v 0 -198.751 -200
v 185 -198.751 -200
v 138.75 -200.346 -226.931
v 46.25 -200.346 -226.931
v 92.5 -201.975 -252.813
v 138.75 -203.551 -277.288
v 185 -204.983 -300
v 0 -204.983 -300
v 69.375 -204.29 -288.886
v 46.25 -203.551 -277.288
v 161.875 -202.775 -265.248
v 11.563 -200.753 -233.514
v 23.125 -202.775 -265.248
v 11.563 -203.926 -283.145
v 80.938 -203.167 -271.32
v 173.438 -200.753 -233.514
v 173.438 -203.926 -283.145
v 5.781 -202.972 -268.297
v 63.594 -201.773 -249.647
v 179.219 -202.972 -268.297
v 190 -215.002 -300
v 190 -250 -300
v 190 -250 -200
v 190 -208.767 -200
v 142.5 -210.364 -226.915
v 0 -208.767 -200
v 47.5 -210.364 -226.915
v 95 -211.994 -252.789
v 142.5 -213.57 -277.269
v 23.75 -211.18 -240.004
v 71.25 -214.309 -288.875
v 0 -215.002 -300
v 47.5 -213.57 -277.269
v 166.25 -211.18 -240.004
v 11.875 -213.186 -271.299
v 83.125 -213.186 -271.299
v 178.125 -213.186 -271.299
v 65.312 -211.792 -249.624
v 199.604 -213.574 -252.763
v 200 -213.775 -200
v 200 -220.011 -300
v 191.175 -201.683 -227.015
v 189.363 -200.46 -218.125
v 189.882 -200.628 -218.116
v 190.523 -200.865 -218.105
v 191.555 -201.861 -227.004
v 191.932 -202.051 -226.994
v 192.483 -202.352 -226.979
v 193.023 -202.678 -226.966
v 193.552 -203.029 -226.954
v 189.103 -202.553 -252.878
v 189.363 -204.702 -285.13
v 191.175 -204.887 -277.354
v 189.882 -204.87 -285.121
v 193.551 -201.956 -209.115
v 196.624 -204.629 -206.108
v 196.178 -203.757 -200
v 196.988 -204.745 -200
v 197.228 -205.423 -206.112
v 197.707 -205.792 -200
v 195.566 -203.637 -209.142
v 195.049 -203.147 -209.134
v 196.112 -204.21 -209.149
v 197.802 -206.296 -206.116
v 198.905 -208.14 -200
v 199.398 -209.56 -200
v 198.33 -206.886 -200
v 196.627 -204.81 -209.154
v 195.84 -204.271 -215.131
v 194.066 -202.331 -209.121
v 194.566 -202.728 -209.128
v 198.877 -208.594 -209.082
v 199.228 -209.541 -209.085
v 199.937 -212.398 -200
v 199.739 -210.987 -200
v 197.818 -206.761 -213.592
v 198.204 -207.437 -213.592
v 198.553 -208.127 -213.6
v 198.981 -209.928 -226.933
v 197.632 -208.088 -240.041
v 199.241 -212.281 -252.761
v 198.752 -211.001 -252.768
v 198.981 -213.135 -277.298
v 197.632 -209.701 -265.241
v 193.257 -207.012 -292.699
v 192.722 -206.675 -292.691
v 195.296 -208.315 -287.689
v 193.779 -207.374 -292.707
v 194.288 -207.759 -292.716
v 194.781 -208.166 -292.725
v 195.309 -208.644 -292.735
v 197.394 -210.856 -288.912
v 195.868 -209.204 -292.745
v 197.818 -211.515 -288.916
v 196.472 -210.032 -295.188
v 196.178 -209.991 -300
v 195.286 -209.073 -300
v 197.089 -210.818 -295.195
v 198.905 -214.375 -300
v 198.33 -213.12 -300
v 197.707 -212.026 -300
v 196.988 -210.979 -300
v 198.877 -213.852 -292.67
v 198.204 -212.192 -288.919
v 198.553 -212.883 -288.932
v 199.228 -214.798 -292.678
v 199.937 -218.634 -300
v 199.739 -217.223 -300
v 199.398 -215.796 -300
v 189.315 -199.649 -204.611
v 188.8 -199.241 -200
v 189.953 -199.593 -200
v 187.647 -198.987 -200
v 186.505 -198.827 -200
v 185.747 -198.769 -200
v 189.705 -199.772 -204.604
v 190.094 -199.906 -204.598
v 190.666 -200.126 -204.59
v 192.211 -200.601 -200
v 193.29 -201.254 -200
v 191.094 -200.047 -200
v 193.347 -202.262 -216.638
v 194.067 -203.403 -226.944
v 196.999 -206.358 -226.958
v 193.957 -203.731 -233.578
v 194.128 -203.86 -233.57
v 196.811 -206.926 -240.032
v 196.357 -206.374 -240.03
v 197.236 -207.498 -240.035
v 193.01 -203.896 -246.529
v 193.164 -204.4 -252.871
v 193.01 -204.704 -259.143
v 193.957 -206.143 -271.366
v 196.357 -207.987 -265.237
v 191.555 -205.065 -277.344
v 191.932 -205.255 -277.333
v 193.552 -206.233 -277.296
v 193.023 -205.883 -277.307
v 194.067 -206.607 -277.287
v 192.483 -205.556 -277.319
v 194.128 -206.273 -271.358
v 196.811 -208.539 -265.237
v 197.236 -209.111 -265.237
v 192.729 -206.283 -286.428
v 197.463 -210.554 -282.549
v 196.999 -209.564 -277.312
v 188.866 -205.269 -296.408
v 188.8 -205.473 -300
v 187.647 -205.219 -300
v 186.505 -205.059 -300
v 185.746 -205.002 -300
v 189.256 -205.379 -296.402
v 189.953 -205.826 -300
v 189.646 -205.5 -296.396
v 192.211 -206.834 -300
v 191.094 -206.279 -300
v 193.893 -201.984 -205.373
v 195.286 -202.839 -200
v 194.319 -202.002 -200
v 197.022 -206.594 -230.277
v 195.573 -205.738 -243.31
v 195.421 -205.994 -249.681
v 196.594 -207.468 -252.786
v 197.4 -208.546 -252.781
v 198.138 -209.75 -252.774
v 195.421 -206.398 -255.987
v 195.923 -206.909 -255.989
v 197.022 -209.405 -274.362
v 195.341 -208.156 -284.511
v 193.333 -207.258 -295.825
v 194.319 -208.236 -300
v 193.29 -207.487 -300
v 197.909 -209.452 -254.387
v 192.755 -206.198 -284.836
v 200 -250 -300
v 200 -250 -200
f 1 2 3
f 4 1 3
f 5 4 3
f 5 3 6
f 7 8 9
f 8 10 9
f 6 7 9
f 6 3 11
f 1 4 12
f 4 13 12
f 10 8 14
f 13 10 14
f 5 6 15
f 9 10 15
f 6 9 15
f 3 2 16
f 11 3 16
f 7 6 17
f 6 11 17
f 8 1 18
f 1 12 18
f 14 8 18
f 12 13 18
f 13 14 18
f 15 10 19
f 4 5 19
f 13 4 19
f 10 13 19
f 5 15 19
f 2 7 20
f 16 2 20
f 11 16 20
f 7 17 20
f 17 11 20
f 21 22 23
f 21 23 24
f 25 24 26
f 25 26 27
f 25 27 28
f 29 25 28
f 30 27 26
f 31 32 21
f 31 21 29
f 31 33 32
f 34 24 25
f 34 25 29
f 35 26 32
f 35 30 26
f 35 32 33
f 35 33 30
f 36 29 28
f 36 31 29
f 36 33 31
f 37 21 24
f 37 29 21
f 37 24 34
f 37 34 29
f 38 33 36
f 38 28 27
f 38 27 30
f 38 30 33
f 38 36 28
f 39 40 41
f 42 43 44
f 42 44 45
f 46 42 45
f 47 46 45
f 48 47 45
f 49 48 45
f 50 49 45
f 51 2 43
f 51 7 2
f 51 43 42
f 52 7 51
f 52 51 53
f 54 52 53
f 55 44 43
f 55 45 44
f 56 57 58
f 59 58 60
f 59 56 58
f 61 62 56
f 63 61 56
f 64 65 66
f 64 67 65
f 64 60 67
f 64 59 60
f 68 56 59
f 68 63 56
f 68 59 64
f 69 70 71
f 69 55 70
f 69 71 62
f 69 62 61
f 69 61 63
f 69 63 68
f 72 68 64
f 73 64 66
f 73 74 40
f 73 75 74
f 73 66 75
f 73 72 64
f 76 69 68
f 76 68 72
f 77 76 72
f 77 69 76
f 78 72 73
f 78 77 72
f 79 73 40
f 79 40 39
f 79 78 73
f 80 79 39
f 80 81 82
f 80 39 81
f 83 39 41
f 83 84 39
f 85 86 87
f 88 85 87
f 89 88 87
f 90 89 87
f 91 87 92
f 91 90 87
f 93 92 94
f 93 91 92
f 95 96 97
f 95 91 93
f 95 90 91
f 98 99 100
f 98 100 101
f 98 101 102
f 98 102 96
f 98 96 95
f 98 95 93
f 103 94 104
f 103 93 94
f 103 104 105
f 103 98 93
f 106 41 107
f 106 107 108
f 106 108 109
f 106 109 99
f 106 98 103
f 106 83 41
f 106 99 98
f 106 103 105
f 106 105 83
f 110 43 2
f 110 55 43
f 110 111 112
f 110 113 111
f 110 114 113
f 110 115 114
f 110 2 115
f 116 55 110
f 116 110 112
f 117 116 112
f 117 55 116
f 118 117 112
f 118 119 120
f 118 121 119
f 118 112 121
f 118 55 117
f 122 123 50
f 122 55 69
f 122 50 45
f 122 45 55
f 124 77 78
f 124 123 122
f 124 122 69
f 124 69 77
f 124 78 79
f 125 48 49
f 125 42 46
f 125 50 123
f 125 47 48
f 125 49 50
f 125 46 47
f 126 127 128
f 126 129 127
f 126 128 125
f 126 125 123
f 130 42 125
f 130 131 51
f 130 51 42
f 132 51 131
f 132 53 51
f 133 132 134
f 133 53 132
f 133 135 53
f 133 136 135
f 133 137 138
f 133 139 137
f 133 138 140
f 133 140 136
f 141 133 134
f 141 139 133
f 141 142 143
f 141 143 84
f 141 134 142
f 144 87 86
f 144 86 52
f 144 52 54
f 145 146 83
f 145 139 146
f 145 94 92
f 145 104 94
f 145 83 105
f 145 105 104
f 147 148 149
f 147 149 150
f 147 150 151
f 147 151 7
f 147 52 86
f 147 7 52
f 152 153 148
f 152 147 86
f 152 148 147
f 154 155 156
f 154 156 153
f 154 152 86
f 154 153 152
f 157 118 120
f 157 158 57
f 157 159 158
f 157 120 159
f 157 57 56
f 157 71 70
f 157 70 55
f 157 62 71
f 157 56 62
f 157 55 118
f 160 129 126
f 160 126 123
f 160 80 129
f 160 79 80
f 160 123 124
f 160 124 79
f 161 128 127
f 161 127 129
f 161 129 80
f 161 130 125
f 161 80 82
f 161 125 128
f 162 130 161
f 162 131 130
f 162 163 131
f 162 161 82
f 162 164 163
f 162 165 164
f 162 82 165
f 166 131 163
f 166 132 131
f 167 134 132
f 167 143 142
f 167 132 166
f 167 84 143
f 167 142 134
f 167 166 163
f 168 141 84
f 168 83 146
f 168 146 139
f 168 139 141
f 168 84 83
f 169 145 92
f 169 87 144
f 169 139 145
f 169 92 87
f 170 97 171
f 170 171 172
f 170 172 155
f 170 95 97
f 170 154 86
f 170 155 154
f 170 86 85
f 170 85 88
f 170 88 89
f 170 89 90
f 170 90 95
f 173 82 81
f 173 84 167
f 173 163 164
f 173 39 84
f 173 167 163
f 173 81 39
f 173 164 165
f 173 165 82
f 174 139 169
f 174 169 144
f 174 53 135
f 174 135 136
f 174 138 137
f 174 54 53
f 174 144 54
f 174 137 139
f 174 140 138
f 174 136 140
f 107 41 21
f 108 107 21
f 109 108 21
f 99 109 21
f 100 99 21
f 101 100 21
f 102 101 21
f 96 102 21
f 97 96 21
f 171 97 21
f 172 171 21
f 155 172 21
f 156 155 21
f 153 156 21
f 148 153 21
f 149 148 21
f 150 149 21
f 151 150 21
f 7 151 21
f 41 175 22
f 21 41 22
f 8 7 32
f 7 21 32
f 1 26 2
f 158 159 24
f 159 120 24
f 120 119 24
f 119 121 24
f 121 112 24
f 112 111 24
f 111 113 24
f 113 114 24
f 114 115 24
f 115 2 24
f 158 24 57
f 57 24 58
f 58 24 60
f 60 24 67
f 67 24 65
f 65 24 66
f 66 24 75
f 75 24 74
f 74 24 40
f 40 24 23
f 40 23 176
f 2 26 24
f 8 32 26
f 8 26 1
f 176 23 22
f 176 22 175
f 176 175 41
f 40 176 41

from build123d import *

# Parameters (mm, degrees)
SKETCH_1_W           = 80
SKETCH_1_H           = 100
EXTRUDE_1_DEPTH      = 100
SKETCH_2_W           = 80
SKETCH_2_H           = 85
CUT_EXTRUDE_1_DEPTH  = 90
CUT_EXTRUDE_5_DEPTH  = 138.477270849
SHELL_2_T            = -2
FILLET_1_R           = 3
FILLET_2_R           = 5
FILLET_3_R           = 3
SKETCH_6_W           = 3.8
SKETCH_6_H           = 2.5
CUT_EXTRUDE_6_DEPTH  = 85
SKETCH_8_W           = 5
SKETCH_8_H           = 5
CUT_EXTRUDE_7_DEPTH  = 100
SKETCH_11_W          = 2
SKETCH_11_H          = 1
CUT_EXTRUDE_8_DEPTH  = 119.74342103
SCALE_1_SCALE        = 5
SKETCH_12_W          = 400
SKETCH_12_H          = 300
SKETCH_12_W_2        = 185
SKETCH_12_H_2        = 29.670884313
CUT_EXTRUDE_11_DEPTH = 594.717104512
SKETCH_15_W          = 190
SKETCH_15_H          = 190
SKETCH_15_H_2        = 200
SKETCH_15_W_2        = 10
CUT_EXTRUDE_13_DEPTH = 575.45626481


with BuildPart() as part:
    # 스케치1 → 보스-돌출1 (new body)
    with BuildSketch(Plane.XY):
        Rectangle(SKETCH_1_W, SKETCH_1_H)
    extrude(amount=-EXTRUDE_1_DEPTH)

    # 스케치2 → 컷-돌출1 (cut)
    with BuildSketch(Plane(origin=(40, 0, 0), x_dir=(0, 0, -1), z_dir=(1, 0, 0))):
        with Locations((40, 7.5)):
            Rectangle(SKETCH_2_W, SKETCH_2_H)
    extrude(amount=-CUT_EXTRUDE_1_DEPTH, mode=Mode.SUBTRACT)

    # 스케치5 → 컷-돌출5 (cut, through all)
    with BuildSketch(Plane(origin=(40, 0, 0), x_dir=(0, 0, -1), z_dir=(1, 0, 0))):
        with BuildLine():
            add(Edge.make_bspline(
                [(0, -39.376697629), (18.60893103, -37.813832642), (60.522018707, -41.448787519), (82.629316251, -41.815039561), (94.476954899, -29.981594577), (72.35205171, -11.407179683), (96, 50)],
                knots=[0, 0, 0, 0, 0.361871867, 0.526261735, 0.755385015, 1, 1, 1, 1], degree=3))
            Line((96, 50), (80, 50))
            Line((80, 50), (80, -35))
            Line((80, -35), (0, -35))
            Line((0, -35), (0, -39.376697629))
        make_face()
    extrude(amount=-CUT_EXTRUDE_5_DEPTH, mode=Mode.SUBTRACT)

    # 쉘2
    shell_2_openings = [part.faces().sort_by_distance(p)[0] for p in [
        (0, 0, -100),
        (0, -50, -50),
    ]]
    offset(amount=SHELL_2_T, openings=shell_2_openings, kind=Kind.INTERSECTION)

    # 필렛1
    fillet_1_edges = [part.edges().sort_by_distance(p)[0] for p in [
        (0, 50, -96),
    ]]
    fillet(fillet_1_edges, radius=FILLET_1_R)

    # 필렛2
    fillet_2_edges = [part.edges().sort_by_distance(p)[0] for p in [
        (0, -39.376697629, 0),
    ]]
    fillet(fillet_2_edges, radius=FILLET_2_R)

    # 필렛3
    fillet_3_edges = [part.edges().sort_by_distance(p)[0] for p in [
        (40, -47.032911569, 0),
        (40, 49.469386486, -96.360930071),
        (-40, 49.469386486, -96.360930071),
        (40, -34.292790316, -87.583679146),
        (-40, -34.292790311, -87.583679133),
        (40, -40.61329303, -1.383366779),
        (-40, -47.032911569, 0),
        (-40, -40.61329303, -1.383366779),
        (-40, 50, -99.032247048),
        (40, 50, -99.032247048),
    ]]
    fillet(fillet_3_edges, radius=FILLET_3_R)

    # 스케치6 → 컷-돌출6 (cut)
    with BuildSketch(Plane(origin=(0, 0, -100), x_dir=(-1, 0, 0), z_dir=(0, 0, -1))):
        with Locations((-10, 10)):
            Rectangle(SKETCH_6_W, SKETCH_6_H)
        with Locations((10, 10)):
            Rectangle(SKETCH_6_W, SKETCH_6_H)
    extrude(amount=-CUT_EXTRUDE_6_DEPTH, mode=Mode.SUBTRACT)

    # 스케치8 → 컷-돌출7 (cut)
    with BuildSketch(Plane(origin=(0, 50, 0), x_dir=(1, 0, 0), z_dir=(0, 1, 0))):
        with Locations((-20, 69.358931696)):
            Rectangle(SKETCH_8_W, SKETCH_8_H)
        with Locations((20, 69.358931696)):
            Rectangle(SKETCH_8_W, SKETCH_8_H)
    extrude(amount=-CUT_EXTRUDE_7_DEPTH, mode=Mode.SUBTRACT)

    # 스케치11 → 컷-돌출8 (cut, through all)
    with BuildSketch(Plane(origin=(0, 0, -100), x_dir=(-1, 0, 0), z_dir=(0, 0, -1))):
        with Locations((-10, 3.626900341)):
            Rectangle(SKETCH_11_W, SKETCH_11_H)
        with Locations((10, 3.626900341)):
            Rectangle(SKETCH_11_W, SKETCH_11_H)
    extrude(amount=-CUT_EXTRUDE_8_DEPTH, mode=Mode.SUBTRACT)


with BuildPart() as part_1:
    # 축척1: scaled about (0, 0, 0)
    add(part.part.scale(SCALE_1_SCALE))

    # 스케치12 → 컷-돌출11 (cut, through all)
    with BuildSketch(Plane.XY):
        with Locations((0, 100)):
            Rectangle(SKETCH_12_W, SKETCH_12_H)
        Polygon((0, -50), (-200, -50), (-200, -250), (-185, -250), (-185, -220.329115687), (0, -220.329115687), align=None)
        with Locations((-92.5, -235.164557844)):
            Rectangle(SKETCH_12_W_2, SKETCH_12_H_2)
    extrude(amount=-CUT_EXTRUDE_11_DEPTH, mode=Mode.SUBTRACT)

    # 스케치15 → 컷-돌출13 (cut, through all)
    with BuildSketch(Plane.XZ.offset(250)):
        with Locations((95, -105)):
            Rectangle(SKETCH_15_W, SKETCH_15_H)
        with BuildLine():
            Line((190, -200), (200, -200))
            Line((200, -200), (200, -15))
            ThreePointArc((200, -15), (195.606601718, -4.393398282), (185, 0))
            Line((185, 0), (0, 0))
            Line((0, 0), (0, -10))
            Line((0, -10), (190, -10))
            Line((190, -10), (190, -200))
        make_face()
        with Locations((95, -400)):
            Rectangle(SKETCH_15_W, SKETCH_15_H_2)
        with Locations((195, -400)):
            Rectangle(SKETCH_15_W_2, SKETCH_15_H_2)
    extrude(amount=-CUT_EXTRUDE_13_DEPTH, mode=Mode.SUBTRACT)


solid = part_1.part
